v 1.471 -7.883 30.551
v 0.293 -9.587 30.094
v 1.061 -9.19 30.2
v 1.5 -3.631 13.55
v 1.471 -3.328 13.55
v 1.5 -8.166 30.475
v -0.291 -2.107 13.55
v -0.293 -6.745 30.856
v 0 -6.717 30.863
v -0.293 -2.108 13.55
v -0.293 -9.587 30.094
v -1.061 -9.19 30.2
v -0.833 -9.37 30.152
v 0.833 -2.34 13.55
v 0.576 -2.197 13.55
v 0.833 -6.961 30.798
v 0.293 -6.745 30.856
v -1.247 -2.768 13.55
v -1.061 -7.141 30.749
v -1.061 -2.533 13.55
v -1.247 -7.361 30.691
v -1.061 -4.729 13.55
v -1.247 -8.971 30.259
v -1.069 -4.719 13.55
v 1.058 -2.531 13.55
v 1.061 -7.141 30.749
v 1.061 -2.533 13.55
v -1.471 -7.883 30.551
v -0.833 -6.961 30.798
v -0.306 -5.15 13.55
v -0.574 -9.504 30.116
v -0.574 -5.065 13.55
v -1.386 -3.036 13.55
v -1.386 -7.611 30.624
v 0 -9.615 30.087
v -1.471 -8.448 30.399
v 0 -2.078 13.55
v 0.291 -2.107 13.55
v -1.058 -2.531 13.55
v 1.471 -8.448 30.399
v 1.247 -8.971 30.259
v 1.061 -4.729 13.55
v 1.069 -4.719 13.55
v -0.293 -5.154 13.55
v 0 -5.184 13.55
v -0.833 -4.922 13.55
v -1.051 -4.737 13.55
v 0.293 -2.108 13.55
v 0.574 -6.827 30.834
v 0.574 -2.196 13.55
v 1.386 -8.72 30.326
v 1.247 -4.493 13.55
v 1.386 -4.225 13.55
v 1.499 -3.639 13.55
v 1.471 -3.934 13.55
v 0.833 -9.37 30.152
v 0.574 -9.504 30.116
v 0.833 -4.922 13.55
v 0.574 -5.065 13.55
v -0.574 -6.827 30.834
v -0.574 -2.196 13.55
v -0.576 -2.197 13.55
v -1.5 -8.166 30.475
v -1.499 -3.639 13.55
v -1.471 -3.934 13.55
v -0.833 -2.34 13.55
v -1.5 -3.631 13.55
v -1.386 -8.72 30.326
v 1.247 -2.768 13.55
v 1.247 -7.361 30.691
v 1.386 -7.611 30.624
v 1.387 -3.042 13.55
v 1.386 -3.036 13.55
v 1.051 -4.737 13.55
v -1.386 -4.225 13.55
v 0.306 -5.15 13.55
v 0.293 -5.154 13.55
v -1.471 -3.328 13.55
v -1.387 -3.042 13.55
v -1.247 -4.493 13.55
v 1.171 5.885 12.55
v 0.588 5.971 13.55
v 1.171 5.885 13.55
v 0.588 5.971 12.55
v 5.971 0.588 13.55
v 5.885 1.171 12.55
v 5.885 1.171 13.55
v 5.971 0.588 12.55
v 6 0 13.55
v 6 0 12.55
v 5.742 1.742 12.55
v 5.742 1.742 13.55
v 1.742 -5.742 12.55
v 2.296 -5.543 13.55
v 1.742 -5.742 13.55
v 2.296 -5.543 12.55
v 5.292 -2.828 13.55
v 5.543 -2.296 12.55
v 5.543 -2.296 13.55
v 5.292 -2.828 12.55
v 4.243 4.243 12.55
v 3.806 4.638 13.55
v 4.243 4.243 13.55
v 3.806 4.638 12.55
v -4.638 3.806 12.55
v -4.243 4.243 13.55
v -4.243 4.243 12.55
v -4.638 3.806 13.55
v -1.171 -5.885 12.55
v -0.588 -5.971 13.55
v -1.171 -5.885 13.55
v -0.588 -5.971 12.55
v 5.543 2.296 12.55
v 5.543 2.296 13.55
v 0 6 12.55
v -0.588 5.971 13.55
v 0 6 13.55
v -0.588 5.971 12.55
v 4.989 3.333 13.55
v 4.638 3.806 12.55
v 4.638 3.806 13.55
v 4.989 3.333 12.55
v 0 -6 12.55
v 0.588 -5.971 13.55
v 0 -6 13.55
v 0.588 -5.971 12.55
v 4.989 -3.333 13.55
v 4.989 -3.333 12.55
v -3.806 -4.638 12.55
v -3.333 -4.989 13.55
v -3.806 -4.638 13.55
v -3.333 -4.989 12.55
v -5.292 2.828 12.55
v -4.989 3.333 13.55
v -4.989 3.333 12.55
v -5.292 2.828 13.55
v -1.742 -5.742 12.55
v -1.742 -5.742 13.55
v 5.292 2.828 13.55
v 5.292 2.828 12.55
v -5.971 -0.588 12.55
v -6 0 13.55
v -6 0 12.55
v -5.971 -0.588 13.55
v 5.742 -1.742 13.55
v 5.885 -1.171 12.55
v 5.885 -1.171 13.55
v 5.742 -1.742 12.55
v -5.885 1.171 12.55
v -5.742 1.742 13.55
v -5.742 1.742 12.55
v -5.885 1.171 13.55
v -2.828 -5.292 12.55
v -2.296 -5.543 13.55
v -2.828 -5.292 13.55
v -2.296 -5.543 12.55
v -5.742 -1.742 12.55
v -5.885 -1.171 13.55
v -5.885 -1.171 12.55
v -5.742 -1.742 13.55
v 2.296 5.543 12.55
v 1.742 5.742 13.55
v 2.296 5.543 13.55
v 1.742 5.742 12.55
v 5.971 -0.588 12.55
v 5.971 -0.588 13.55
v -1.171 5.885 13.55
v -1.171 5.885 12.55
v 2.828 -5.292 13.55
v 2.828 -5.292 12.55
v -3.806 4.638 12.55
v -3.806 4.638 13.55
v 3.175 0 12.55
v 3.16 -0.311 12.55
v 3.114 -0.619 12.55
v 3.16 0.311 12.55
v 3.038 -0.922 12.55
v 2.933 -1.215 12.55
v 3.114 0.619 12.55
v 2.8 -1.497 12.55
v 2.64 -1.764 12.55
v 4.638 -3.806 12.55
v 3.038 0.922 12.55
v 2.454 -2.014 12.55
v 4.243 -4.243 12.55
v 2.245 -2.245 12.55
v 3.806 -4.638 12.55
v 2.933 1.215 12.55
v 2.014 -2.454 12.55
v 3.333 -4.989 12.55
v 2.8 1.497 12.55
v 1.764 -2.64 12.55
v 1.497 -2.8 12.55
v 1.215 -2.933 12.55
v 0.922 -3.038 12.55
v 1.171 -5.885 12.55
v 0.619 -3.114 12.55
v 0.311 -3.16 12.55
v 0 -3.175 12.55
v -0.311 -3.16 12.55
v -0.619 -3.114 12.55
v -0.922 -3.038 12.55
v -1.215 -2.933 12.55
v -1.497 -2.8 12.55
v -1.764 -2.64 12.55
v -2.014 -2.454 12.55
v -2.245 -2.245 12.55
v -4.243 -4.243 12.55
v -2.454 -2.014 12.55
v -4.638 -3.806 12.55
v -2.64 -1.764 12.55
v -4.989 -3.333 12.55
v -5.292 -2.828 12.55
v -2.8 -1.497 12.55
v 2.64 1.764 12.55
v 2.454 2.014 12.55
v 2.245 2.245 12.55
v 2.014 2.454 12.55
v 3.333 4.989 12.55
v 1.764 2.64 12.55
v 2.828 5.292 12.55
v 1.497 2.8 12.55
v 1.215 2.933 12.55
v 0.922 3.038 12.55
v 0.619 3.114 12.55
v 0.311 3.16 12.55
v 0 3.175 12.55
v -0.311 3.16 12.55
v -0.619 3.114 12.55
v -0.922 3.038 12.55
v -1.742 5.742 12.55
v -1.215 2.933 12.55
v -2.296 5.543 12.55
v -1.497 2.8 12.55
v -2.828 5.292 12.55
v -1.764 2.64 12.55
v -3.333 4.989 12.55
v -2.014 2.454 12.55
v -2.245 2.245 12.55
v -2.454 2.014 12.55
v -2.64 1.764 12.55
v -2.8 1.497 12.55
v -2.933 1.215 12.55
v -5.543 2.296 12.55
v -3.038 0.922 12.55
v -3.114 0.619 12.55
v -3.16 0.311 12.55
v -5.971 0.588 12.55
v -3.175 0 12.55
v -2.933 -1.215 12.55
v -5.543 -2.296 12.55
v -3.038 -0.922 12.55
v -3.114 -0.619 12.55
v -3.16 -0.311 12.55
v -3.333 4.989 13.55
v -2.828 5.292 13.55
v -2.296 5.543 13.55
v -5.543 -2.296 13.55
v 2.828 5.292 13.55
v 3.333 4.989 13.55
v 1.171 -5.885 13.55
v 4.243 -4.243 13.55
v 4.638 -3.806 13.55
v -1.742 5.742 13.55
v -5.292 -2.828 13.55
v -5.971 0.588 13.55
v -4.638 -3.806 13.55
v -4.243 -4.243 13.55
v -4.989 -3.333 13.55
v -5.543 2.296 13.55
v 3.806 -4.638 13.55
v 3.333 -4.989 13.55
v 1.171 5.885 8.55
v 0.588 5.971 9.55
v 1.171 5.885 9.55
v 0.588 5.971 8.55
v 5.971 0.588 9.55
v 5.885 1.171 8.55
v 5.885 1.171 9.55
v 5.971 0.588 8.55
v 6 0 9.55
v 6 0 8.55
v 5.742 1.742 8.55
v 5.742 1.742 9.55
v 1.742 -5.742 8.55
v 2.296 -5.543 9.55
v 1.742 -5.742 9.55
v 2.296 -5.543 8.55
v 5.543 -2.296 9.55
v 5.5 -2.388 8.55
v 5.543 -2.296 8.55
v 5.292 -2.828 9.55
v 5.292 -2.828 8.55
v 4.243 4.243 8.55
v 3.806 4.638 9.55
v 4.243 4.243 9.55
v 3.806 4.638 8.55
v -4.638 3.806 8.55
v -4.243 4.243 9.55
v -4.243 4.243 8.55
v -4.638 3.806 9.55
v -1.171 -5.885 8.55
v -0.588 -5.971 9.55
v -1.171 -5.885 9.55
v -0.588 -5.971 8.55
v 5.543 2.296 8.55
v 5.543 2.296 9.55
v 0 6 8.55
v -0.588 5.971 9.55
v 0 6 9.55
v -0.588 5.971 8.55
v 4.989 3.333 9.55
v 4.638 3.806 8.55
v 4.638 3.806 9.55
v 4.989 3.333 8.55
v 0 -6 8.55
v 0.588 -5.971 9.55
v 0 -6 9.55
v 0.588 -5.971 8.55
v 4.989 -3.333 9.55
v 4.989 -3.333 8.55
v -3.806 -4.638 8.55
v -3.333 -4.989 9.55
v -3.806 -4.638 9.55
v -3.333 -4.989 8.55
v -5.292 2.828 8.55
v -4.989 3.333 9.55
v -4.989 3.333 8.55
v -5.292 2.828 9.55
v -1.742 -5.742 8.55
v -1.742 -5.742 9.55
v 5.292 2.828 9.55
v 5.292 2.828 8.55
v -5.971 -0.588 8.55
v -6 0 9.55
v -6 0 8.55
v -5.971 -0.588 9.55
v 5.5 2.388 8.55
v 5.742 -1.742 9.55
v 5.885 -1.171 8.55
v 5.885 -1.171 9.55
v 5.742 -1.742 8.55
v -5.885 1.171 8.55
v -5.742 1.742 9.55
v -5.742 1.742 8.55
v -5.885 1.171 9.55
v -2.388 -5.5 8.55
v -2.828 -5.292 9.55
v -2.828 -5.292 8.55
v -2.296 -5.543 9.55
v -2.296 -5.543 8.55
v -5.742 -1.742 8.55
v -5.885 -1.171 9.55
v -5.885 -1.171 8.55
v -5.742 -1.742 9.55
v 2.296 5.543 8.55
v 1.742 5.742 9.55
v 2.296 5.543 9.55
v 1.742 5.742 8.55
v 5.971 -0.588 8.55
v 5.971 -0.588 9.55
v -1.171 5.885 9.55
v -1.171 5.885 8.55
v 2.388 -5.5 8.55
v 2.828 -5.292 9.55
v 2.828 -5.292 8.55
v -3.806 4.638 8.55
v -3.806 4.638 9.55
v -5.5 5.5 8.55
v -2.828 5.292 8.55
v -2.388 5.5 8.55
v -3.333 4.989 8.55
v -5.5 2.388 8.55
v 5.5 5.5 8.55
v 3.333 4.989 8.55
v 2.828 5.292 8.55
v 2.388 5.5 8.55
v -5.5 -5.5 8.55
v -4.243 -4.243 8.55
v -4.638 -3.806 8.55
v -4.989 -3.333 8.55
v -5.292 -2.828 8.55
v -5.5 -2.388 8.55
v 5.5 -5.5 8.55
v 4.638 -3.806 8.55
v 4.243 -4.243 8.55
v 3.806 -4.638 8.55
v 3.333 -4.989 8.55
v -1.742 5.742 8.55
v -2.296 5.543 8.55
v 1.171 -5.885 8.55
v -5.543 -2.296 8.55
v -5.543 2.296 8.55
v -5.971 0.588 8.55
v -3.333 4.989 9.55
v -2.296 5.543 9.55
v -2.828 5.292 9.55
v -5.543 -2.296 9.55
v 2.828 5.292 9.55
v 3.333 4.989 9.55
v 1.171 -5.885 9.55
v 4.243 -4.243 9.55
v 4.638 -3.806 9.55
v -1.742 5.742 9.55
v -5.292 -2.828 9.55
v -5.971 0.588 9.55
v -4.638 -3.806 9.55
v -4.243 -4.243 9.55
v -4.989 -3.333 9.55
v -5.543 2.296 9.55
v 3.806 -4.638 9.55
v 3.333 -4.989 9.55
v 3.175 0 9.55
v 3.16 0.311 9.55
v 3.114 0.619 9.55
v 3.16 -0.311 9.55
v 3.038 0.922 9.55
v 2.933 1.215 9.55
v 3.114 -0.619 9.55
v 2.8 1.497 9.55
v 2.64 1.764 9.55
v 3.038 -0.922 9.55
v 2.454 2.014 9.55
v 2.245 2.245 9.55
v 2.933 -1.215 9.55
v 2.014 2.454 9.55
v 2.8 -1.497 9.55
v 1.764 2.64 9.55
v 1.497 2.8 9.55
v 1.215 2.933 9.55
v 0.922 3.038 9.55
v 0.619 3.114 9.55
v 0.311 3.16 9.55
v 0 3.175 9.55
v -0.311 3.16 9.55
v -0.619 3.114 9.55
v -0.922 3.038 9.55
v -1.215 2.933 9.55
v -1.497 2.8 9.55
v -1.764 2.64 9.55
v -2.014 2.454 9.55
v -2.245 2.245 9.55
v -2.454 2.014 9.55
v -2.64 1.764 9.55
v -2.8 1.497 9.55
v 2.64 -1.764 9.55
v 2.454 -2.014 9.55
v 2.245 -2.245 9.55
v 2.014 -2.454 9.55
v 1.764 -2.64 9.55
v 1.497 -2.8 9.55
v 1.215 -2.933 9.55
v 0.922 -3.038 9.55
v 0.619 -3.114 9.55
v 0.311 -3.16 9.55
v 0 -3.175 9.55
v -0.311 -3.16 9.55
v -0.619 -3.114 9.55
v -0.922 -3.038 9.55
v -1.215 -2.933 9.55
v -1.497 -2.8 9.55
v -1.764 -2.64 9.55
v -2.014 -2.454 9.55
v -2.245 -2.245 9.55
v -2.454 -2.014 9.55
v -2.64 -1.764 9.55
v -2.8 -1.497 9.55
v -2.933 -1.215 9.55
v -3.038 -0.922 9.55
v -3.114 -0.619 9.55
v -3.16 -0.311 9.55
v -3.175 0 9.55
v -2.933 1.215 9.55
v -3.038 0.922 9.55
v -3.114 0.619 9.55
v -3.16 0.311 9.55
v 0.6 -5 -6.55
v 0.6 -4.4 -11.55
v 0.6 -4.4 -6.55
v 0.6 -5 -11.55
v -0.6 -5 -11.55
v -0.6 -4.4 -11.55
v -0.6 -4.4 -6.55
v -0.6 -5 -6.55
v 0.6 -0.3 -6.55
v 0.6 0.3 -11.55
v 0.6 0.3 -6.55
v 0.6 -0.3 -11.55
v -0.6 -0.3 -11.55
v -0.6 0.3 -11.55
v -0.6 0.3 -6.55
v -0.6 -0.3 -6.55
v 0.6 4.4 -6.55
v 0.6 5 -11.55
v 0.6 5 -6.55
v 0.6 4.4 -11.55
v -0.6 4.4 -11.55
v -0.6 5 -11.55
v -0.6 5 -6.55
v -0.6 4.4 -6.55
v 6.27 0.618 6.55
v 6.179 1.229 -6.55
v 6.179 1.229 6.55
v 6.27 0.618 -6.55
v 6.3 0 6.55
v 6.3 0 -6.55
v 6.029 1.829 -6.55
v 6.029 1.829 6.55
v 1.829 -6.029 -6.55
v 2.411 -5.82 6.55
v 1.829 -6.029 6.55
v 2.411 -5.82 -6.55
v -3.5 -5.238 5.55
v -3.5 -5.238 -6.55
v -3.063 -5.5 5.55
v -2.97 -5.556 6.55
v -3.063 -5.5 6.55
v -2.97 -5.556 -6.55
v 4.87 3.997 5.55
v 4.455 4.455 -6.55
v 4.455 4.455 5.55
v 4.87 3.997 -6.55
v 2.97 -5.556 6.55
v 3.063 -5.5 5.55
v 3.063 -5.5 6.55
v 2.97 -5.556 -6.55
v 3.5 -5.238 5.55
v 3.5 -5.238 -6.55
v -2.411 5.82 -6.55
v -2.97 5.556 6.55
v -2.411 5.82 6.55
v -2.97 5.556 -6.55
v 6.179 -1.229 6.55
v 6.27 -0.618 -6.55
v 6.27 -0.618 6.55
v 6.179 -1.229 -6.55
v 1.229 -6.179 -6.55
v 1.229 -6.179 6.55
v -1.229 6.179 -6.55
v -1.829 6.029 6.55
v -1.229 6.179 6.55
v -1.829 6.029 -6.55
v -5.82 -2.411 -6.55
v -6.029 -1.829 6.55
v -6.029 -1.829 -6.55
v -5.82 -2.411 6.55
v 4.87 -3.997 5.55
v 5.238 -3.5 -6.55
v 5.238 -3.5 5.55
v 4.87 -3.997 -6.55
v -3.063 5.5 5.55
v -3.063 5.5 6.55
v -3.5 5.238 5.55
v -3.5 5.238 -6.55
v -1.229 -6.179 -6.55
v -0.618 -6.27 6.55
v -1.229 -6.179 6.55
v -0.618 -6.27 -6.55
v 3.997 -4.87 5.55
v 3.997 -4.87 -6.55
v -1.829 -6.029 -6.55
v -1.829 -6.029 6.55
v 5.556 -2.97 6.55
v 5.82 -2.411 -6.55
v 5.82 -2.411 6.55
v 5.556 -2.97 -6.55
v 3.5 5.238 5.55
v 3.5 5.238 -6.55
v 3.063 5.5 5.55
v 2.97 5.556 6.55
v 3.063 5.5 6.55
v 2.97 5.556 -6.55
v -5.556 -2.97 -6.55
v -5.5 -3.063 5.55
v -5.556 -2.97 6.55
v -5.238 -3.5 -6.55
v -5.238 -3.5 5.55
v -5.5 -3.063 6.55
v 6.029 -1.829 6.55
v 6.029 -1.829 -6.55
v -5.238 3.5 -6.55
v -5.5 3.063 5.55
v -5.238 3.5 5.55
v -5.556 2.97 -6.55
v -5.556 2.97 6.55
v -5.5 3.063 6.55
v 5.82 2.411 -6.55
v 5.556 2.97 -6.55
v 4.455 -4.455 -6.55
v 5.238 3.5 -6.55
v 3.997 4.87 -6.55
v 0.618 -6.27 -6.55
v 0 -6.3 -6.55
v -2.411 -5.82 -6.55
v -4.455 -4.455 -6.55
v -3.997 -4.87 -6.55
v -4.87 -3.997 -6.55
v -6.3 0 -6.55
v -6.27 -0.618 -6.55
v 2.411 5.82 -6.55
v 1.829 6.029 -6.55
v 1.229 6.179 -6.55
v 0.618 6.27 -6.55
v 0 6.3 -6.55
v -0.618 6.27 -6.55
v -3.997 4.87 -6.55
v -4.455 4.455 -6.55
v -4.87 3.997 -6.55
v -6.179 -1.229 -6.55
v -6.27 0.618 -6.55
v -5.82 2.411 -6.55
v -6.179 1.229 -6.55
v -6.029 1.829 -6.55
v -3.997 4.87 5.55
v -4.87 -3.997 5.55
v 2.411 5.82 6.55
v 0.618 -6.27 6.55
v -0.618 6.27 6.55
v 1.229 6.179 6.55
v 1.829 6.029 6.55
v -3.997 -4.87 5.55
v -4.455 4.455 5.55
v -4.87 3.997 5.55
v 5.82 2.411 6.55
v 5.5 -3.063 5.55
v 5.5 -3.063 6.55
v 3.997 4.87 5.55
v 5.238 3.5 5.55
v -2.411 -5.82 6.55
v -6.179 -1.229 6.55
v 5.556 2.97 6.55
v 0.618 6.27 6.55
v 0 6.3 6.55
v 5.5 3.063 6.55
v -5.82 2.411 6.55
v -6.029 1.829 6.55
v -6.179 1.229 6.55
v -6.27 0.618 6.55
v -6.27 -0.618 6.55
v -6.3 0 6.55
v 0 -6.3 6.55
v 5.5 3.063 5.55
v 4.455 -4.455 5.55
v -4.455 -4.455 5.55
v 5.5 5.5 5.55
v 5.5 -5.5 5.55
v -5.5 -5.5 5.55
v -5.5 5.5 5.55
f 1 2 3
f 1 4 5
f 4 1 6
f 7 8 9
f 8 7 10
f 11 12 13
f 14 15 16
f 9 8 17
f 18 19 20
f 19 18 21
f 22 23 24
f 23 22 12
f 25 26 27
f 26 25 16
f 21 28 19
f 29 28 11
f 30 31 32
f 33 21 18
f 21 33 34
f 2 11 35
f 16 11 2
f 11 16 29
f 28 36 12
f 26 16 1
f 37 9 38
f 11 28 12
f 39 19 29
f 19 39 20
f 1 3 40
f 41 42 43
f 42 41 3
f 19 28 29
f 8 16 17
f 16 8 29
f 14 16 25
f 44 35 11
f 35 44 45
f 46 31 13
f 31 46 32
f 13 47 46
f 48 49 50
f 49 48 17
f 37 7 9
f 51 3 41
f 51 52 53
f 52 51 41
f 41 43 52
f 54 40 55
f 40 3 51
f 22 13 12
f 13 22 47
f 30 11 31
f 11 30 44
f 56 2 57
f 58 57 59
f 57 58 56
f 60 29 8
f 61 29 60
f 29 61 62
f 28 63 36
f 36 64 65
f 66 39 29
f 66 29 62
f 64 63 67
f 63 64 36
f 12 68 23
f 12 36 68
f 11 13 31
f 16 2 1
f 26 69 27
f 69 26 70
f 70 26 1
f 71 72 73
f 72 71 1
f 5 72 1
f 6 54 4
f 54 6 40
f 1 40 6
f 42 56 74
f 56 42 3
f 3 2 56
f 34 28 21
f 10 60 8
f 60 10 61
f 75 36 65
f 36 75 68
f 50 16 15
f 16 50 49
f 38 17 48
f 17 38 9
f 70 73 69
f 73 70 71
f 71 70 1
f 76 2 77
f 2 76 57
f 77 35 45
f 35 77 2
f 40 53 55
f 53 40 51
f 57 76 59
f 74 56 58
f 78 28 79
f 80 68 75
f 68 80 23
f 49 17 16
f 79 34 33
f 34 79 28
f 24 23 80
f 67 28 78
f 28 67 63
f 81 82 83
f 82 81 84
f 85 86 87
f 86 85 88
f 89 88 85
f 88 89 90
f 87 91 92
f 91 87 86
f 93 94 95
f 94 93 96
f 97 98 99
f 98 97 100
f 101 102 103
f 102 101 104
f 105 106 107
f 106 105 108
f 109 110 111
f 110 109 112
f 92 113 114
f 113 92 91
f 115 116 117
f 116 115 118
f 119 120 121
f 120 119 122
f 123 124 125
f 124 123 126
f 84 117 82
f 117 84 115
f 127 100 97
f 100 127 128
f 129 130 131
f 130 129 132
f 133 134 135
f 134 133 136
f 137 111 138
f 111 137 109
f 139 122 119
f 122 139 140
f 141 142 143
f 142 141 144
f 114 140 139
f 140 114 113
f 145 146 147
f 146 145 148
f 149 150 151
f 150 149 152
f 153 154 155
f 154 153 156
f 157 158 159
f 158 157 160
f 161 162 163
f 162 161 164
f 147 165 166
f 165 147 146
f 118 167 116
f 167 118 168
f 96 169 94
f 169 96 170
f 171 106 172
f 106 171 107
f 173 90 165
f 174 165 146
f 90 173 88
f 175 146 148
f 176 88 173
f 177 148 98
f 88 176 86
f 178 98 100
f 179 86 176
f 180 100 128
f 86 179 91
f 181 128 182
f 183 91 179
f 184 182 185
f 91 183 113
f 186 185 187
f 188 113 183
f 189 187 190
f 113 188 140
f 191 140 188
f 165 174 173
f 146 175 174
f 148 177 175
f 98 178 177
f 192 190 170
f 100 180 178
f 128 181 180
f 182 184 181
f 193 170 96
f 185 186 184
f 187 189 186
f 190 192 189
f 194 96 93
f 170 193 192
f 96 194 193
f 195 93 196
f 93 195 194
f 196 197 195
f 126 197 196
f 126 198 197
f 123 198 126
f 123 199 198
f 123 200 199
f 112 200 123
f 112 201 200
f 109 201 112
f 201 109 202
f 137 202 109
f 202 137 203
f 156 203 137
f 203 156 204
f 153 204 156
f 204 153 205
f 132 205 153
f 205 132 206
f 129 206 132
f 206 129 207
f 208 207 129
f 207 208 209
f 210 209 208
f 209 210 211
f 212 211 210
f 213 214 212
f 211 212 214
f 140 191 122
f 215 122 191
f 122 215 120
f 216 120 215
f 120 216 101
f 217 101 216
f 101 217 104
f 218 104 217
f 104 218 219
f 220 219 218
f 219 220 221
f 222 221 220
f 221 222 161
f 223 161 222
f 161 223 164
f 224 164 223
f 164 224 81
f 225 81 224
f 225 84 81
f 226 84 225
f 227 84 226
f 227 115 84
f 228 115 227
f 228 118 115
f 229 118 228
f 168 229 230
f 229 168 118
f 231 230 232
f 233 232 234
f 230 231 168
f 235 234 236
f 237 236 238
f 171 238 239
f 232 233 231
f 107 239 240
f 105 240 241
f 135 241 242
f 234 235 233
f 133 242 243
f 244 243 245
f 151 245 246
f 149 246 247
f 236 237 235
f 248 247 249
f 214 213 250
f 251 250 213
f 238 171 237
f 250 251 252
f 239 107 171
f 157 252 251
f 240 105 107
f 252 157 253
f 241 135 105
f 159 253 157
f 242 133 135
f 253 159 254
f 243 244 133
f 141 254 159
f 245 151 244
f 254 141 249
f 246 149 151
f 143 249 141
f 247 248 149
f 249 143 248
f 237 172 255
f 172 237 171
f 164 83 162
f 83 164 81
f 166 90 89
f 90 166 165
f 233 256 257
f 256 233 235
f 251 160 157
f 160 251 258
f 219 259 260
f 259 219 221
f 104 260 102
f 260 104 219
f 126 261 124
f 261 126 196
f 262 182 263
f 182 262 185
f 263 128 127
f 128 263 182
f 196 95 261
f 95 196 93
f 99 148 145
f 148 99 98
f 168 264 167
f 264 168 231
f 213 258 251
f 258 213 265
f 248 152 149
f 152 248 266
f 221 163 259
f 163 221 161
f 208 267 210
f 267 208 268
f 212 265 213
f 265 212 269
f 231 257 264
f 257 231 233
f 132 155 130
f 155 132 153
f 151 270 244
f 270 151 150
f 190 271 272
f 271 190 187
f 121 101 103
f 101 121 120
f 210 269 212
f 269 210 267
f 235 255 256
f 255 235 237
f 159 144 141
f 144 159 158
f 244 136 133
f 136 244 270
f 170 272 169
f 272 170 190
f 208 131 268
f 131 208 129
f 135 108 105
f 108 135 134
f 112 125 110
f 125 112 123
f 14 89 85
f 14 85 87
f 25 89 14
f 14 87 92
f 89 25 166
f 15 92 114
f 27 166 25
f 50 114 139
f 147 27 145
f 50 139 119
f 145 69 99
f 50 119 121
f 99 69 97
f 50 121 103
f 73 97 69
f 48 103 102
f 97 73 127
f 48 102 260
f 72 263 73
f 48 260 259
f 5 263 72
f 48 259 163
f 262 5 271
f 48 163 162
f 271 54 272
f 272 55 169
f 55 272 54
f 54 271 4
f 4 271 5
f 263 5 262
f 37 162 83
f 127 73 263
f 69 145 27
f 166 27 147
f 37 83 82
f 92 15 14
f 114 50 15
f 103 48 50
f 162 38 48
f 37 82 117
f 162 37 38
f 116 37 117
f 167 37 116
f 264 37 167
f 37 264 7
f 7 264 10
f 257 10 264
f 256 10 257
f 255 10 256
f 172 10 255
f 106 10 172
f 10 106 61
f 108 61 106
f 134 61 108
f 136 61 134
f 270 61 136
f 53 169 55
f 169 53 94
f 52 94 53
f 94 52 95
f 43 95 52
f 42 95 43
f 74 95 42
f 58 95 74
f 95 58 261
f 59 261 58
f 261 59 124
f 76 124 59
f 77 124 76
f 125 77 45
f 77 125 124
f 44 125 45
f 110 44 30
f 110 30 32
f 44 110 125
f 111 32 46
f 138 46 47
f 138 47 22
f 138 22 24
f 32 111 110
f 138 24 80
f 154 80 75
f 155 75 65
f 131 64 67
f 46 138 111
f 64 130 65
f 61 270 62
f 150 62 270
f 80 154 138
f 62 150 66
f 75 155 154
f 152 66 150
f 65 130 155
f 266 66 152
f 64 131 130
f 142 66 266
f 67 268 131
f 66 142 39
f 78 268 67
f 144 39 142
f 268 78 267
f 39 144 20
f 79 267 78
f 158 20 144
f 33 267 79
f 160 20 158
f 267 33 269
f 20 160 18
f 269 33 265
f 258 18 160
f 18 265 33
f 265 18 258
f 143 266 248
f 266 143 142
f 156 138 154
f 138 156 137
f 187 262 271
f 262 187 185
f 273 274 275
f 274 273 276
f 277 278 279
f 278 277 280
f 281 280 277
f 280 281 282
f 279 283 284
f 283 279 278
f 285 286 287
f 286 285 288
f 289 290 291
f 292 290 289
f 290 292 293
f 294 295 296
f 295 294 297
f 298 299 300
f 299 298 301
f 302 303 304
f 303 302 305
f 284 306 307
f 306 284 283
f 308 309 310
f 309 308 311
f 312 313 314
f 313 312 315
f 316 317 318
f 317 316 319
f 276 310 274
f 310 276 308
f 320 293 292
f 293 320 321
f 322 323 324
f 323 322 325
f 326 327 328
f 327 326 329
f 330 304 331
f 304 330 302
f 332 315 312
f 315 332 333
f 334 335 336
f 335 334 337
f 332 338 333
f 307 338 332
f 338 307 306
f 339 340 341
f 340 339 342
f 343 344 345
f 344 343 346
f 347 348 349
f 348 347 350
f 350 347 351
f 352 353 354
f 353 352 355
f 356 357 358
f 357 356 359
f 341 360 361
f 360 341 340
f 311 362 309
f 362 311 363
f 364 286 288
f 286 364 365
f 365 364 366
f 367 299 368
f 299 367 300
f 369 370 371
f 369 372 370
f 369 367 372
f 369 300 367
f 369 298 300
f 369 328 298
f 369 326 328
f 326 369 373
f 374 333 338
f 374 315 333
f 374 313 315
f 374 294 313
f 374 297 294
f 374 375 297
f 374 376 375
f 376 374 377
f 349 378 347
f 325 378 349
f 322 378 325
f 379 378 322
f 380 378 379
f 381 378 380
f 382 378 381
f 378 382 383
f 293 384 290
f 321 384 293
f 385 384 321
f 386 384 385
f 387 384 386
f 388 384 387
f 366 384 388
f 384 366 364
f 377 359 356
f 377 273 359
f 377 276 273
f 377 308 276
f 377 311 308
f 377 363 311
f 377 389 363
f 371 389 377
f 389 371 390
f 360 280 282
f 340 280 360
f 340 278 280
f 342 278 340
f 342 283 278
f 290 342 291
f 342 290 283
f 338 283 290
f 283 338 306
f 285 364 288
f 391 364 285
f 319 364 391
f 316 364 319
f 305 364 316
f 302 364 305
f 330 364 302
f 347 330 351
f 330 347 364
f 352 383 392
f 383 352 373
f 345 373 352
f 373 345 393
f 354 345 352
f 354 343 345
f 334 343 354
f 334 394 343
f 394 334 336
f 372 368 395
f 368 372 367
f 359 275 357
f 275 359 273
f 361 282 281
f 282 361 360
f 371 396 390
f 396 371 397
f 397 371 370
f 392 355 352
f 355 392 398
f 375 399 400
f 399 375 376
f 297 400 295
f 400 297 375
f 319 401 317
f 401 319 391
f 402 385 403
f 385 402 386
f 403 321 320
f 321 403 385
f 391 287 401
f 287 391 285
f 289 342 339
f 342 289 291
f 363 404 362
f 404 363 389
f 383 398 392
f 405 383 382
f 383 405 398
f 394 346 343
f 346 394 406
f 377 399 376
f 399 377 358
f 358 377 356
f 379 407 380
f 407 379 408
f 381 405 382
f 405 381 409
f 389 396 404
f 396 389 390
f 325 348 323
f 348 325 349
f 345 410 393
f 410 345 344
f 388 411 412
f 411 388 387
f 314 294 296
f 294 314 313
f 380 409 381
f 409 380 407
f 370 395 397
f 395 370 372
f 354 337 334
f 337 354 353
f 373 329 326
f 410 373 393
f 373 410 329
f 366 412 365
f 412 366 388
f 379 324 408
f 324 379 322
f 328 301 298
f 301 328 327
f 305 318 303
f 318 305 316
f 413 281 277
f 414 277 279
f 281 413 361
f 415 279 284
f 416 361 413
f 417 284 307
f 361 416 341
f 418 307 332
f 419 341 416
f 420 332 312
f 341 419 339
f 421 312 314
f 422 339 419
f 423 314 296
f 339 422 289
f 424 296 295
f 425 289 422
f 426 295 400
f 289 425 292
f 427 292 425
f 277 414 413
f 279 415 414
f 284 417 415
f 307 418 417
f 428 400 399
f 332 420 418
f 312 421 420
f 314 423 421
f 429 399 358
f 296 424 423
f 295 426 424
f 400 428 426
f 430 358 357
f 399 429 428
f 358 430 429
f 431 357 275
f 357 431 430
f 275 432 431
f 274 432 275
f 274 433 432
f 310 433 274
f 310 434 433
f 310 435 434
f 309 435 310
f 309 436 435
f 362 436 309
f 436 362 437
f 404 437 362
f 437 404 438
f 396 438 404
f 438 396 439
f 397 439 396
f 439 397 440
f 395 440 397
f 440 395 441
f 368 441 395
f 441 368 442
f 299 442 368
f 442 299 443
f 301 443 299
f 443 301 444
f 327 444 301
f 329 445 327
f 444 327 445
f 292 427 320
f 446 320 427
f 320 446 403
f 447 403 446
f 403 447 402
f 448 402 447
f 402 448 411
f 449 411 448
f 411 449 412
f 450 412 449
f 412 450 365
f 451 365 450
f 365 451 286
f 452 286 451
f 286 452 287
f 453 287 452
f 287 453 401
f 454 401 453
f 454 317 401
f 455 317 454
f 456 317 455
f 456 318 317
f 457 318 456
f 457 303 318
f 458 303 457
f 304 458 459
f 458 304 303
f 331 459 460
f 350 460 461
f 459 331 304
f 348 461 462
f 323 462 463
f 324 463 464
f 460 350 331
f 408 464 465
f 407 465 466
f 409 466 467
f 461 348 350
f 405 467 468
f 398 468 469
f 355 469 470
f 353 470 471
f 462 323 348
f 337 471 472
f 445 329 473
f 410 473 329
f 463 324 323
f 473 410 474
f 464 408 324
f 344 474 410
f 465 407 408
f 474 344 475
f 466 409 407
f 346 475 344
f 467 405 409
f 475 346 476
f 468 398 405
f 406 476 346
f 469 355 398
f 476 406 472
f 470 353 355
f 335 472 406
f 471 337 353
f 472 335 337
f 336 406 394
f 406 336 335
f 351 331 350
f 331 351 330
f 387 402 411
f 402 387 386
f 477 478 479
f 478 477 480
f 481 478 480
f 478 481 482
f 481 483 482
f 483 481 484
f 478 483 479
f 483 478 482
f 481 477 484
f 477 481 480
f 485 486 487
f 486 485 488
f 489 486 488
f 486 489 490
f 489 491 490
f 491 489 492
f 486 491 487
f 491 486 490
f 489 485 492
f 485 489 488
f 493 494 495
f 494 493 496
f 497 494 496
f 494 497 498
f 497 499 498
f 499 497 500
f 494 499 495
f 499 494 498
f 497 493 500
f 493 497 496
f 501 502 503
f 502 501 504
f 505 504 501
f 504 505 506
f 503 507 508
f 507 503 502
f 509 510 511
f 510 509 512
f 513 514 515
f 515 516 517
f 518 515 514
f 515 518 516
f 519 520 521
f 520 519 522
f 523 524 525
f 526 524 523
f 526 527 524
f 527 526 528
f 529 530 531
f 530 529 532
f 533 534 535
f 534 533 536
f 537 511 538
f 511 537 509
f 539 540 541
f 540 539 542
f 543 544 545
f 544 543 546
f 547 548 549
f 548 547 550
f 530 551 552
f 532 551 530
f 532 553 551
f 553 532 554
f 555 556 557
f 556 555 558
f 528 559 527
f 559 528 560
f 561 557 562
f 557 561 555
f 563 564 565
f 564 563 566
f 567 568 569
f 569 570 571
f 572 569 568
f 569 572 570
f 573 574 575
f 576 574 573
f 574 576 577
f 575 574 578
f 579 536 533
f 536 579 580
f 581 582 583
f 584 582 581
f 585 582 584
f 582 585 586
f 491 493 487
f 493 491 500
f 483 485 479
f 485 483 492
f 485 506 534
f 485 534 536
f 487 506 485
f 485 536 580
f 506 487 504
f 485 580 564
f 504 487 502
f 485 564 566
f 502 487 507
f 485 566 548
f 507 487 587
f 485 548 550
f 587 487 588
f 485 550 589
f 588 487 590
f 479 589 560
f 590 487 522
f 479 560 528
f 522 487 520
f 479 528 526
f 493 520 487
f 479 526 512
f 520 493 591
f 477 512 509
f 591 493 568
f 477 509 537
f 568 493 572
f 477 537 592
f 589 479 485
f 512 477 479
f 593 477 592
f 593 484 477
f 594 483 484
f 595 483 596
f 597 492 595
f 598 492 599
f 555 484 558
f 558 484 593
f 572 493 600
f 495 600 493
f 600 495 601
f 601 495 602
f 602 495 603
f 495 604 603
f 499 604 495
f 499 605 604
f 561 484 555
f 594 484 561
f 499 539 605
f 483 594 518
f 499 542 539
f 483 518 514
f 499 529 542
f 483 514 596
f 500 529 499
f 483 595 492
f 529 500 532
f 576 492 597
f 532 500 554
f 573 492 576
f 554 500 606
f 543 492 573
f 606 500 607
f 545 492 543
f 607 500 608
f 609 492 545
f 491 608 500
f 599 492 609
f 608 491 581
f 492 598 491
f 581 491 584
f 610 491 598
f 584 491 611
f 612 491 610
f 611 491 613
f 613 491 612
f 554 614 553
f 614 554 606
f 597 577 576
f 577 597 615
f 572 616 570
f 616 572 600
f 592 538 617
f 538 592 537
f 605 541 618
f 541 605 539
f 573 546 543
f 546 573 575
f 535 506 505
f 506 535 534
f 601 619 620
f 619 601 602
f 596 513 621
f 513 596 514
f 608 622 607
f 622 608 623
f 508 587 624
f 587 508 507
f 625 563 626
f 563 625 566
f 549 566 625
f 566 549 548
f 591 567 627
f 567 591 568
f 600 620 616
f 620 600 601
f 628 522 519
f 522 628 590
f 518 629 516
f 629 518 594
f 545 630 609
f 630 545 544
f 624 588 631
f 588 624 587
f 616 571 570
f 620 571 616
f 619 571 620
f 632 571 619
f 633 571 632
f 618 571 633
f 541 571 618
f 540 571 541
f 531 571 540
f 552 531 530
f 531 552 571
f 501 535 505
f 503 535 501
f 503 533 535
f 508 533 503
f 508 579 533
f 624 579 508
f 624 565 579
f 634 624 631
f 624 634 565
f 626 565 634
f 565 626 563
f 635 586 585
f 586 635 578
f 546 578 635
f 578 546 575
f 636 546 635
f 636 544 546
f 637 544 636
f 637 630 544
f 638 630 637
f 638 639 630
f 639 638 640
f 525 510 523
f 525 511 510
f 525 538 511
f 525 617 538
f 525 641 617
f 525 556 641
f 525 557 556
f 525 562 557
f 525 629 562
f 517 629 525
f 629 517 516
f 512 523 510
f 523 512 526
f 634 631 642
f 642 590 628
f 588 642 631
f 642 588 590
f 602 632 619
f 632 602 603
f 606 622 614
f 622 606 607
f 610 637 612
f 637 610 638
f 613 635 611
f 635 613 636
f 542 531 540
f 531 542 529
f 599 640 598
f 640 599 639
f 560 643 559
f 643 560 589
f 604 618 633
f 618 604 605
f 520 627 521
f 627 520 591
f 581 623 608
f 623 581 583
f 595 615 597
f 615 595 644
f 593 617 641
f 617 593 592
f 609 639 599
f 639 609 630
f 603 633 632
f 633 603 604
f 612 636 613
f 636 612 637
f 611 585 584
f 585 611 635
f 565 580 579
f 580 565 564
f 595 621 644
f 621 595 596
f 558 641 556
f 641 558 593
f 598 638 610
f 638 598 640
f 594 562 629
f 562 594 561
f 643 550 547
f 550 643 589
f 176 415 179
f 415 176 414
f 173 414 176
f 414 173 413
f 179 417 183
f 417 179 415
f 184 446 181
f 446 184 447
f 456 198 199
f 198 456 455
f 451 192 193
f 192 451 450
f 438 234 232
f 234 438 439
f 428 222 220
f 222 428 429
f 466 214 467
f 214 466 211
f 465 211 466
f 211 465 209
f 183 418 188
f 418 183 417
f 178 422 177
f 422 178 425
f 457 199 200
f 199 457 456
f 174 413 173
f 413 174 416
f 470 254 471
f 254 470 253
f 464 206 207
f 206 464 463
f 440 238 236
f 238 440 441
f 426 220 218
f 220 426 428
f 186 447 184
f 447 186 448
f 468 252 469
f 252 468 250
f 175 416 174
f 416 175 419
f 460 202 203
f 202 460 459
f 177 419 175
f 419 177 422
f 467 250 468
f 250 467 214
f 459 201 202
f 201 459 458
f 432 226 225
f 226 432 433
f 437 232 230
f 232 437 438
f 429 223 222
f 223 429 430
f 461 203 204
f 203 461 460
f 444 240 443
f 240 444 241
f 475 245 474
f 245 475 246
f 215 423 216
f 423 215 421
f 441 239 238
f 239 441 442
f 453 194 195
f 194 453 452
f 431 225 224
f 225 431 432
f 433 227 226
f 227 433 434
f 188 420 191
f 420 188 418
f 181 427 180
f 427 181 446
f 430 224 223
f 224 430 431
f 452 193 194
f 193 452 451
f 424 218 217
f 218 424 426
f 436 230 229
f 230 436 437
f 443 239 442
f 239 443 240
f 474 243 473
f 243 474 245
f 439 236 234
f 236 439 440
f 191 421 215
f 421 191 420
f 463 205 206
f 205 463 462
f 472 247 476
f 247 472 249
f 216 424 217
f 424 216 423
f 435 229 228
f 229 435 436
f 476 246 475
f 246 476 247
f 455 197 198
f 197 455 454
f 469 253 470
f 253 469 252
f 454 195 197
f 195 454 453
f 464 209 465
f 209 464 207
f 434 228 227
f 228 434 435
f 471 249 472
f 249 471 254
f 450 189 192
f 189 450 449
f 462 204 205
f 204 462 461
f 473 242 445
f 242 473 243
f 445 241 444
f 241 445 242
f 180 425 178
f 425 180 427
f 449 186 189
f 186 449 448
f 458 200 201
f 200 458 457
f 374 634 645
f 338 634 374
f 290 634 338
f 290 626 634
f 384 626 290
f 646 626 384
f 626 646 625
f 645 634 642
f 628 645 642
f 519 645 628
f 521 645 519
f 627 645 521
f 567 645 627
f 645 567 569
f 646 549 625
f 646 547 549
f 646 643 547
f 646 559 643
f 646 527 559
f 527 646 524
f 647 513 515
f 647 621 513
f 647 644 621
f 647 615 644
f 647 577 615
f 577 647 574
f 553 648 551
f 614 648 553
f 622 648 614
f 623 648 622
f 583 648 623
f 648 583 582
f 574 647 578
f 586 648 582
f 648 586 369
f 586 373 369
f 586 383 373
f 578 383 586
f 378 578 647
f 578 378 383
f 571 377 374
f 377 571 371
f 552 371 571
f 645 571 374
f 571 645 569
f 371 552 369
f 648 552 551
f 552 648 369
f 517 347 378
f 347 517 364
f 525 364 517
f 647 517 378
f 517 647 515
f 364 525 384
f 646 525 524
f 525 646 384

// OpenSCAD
// Parameters
body_diameter_mm = 12.6; //[6.3:25.2:0.1]
body_height_mm = 13.1; //[6.55:26.2:0.1]
panel_thickness_mm = 3; //[0.5:8:0.1]
thread_outer_diameter_mm = 6.35; //[3.2:12.7:0.05]
thread_length_mm = 8; //[4:16:0.1]
lever_length_mm = 18; //[9:36:0.1]
lever_angle_deg = 15; //[-45:45:1]
pin_count = 3; //[2:6:1]
pin_pitch_mm = 4.7; //[2.35:9.4:0.1]
eps_mm = 1; //[0.5:2:0.1]
washer_od_mm = 12; //[6:24:0.1]
washer_thickness_mm = 1; //[0.5:2.5:0.1]
nut_flat_width_mm = 11; //[6:22:0.1]
nut_thickness_mm = 3; //[1.5:6:0.1]
pin_length_mm = 6; //[3:12:0.1]
pin_width_mm = 1.2; //[0.6:2.4:0.05]
pin_thickness_mm = 0.6; //[0.3:1.2:0.05]
pin_row_spacing_mm = 3.5; //[1.75:7:0.1]
lever_diameter_mm = 3; //[1.5:6:0.1]
lever_knob_diameter_mm = 6; //[3:12:0.1]
lever_knob_height_mm = 4; //[2:8:0.1]

// Toggle switch - complete geometry
module toggle() {
  // Main switch body
  color("DimGray") {
    translate([0, 0, 0])
      cylinder(h=body_height_mm, r=body_diameter_mm/2, center=true, $fn=64);
  }
  
  // Mounting bushing/thread section
  color("Silver") {
    translate([0, 0, body_height_mm/2 + thread_length_mm/2 - eps_mm])
      cylinder(h=thread_length_mm, r=thread_outer_diameter_mm/2, center=true, $fn=64);
  }
  
  // Toggle lever
  color("Black") {
    rotate([lever_angle_deg, 0, 0])
      translate([0, 0, body_height_mm/2 + thread_length_mm - eps_mm + lever_length_mm/2])
        cylinder(h=lever_length_mm, r=lever_diameter_mm/2, center=true, $fn=32);
    
    // Lever knob
    translate([0, 0, lever_length_mm/2 - lever_knob_height_mm/2])
      cylinder(h=lever_knob_height_mm, r=lever_knob_diameter_mm/2, center=true, $fn=32);
  }
  
  // Washer stack
  color("Silver") {
    translate([0, 0, body_height_mm/2 + thread_length_mm - eps_mm - washer_thickness_mm/2])
      cylinder(h=washer_thickness_mm, r=washer_od_mm/2, center=true, $fn=64);
    
    translate([0, 0, body_height_mm/2 + thread_length_mm - eps_mm - washer_thickness_mm - panel_thickness_mm - washer_thickness_mm/2])
      cylinder(h=washer_thickness_mm, r=washer_od_mm/2, center=true, $fn=64);
  }
  
  // Nut
  color("Silver") {
    translate([0, 0, body_height_mm/2 + thread_length_mm - eps_mm - washer_thickness_mm - panel_thickness_mm - washer_thickness_mm - nut_thickness_mm/2])
      cube([nut_flat_width_mm, nut_flat_width_mm, nut_thickness_mm], center=true);
  }
  
  // Electrical pins
  color("Copper") {
    for (i = [0:pin_count-1]) {
      translate([0, (i - (pin_count-1)/2) * pin_pitch_mm, -body_height_mm/2 - pin_length_mm/2 + eps_mm])
        cube([pin_width_mm, pin_thickness_mm, pin_length_mm], center=true);
    }
  }
}

// Assembly
module assembly() {
  toggle();
}

assembly();
